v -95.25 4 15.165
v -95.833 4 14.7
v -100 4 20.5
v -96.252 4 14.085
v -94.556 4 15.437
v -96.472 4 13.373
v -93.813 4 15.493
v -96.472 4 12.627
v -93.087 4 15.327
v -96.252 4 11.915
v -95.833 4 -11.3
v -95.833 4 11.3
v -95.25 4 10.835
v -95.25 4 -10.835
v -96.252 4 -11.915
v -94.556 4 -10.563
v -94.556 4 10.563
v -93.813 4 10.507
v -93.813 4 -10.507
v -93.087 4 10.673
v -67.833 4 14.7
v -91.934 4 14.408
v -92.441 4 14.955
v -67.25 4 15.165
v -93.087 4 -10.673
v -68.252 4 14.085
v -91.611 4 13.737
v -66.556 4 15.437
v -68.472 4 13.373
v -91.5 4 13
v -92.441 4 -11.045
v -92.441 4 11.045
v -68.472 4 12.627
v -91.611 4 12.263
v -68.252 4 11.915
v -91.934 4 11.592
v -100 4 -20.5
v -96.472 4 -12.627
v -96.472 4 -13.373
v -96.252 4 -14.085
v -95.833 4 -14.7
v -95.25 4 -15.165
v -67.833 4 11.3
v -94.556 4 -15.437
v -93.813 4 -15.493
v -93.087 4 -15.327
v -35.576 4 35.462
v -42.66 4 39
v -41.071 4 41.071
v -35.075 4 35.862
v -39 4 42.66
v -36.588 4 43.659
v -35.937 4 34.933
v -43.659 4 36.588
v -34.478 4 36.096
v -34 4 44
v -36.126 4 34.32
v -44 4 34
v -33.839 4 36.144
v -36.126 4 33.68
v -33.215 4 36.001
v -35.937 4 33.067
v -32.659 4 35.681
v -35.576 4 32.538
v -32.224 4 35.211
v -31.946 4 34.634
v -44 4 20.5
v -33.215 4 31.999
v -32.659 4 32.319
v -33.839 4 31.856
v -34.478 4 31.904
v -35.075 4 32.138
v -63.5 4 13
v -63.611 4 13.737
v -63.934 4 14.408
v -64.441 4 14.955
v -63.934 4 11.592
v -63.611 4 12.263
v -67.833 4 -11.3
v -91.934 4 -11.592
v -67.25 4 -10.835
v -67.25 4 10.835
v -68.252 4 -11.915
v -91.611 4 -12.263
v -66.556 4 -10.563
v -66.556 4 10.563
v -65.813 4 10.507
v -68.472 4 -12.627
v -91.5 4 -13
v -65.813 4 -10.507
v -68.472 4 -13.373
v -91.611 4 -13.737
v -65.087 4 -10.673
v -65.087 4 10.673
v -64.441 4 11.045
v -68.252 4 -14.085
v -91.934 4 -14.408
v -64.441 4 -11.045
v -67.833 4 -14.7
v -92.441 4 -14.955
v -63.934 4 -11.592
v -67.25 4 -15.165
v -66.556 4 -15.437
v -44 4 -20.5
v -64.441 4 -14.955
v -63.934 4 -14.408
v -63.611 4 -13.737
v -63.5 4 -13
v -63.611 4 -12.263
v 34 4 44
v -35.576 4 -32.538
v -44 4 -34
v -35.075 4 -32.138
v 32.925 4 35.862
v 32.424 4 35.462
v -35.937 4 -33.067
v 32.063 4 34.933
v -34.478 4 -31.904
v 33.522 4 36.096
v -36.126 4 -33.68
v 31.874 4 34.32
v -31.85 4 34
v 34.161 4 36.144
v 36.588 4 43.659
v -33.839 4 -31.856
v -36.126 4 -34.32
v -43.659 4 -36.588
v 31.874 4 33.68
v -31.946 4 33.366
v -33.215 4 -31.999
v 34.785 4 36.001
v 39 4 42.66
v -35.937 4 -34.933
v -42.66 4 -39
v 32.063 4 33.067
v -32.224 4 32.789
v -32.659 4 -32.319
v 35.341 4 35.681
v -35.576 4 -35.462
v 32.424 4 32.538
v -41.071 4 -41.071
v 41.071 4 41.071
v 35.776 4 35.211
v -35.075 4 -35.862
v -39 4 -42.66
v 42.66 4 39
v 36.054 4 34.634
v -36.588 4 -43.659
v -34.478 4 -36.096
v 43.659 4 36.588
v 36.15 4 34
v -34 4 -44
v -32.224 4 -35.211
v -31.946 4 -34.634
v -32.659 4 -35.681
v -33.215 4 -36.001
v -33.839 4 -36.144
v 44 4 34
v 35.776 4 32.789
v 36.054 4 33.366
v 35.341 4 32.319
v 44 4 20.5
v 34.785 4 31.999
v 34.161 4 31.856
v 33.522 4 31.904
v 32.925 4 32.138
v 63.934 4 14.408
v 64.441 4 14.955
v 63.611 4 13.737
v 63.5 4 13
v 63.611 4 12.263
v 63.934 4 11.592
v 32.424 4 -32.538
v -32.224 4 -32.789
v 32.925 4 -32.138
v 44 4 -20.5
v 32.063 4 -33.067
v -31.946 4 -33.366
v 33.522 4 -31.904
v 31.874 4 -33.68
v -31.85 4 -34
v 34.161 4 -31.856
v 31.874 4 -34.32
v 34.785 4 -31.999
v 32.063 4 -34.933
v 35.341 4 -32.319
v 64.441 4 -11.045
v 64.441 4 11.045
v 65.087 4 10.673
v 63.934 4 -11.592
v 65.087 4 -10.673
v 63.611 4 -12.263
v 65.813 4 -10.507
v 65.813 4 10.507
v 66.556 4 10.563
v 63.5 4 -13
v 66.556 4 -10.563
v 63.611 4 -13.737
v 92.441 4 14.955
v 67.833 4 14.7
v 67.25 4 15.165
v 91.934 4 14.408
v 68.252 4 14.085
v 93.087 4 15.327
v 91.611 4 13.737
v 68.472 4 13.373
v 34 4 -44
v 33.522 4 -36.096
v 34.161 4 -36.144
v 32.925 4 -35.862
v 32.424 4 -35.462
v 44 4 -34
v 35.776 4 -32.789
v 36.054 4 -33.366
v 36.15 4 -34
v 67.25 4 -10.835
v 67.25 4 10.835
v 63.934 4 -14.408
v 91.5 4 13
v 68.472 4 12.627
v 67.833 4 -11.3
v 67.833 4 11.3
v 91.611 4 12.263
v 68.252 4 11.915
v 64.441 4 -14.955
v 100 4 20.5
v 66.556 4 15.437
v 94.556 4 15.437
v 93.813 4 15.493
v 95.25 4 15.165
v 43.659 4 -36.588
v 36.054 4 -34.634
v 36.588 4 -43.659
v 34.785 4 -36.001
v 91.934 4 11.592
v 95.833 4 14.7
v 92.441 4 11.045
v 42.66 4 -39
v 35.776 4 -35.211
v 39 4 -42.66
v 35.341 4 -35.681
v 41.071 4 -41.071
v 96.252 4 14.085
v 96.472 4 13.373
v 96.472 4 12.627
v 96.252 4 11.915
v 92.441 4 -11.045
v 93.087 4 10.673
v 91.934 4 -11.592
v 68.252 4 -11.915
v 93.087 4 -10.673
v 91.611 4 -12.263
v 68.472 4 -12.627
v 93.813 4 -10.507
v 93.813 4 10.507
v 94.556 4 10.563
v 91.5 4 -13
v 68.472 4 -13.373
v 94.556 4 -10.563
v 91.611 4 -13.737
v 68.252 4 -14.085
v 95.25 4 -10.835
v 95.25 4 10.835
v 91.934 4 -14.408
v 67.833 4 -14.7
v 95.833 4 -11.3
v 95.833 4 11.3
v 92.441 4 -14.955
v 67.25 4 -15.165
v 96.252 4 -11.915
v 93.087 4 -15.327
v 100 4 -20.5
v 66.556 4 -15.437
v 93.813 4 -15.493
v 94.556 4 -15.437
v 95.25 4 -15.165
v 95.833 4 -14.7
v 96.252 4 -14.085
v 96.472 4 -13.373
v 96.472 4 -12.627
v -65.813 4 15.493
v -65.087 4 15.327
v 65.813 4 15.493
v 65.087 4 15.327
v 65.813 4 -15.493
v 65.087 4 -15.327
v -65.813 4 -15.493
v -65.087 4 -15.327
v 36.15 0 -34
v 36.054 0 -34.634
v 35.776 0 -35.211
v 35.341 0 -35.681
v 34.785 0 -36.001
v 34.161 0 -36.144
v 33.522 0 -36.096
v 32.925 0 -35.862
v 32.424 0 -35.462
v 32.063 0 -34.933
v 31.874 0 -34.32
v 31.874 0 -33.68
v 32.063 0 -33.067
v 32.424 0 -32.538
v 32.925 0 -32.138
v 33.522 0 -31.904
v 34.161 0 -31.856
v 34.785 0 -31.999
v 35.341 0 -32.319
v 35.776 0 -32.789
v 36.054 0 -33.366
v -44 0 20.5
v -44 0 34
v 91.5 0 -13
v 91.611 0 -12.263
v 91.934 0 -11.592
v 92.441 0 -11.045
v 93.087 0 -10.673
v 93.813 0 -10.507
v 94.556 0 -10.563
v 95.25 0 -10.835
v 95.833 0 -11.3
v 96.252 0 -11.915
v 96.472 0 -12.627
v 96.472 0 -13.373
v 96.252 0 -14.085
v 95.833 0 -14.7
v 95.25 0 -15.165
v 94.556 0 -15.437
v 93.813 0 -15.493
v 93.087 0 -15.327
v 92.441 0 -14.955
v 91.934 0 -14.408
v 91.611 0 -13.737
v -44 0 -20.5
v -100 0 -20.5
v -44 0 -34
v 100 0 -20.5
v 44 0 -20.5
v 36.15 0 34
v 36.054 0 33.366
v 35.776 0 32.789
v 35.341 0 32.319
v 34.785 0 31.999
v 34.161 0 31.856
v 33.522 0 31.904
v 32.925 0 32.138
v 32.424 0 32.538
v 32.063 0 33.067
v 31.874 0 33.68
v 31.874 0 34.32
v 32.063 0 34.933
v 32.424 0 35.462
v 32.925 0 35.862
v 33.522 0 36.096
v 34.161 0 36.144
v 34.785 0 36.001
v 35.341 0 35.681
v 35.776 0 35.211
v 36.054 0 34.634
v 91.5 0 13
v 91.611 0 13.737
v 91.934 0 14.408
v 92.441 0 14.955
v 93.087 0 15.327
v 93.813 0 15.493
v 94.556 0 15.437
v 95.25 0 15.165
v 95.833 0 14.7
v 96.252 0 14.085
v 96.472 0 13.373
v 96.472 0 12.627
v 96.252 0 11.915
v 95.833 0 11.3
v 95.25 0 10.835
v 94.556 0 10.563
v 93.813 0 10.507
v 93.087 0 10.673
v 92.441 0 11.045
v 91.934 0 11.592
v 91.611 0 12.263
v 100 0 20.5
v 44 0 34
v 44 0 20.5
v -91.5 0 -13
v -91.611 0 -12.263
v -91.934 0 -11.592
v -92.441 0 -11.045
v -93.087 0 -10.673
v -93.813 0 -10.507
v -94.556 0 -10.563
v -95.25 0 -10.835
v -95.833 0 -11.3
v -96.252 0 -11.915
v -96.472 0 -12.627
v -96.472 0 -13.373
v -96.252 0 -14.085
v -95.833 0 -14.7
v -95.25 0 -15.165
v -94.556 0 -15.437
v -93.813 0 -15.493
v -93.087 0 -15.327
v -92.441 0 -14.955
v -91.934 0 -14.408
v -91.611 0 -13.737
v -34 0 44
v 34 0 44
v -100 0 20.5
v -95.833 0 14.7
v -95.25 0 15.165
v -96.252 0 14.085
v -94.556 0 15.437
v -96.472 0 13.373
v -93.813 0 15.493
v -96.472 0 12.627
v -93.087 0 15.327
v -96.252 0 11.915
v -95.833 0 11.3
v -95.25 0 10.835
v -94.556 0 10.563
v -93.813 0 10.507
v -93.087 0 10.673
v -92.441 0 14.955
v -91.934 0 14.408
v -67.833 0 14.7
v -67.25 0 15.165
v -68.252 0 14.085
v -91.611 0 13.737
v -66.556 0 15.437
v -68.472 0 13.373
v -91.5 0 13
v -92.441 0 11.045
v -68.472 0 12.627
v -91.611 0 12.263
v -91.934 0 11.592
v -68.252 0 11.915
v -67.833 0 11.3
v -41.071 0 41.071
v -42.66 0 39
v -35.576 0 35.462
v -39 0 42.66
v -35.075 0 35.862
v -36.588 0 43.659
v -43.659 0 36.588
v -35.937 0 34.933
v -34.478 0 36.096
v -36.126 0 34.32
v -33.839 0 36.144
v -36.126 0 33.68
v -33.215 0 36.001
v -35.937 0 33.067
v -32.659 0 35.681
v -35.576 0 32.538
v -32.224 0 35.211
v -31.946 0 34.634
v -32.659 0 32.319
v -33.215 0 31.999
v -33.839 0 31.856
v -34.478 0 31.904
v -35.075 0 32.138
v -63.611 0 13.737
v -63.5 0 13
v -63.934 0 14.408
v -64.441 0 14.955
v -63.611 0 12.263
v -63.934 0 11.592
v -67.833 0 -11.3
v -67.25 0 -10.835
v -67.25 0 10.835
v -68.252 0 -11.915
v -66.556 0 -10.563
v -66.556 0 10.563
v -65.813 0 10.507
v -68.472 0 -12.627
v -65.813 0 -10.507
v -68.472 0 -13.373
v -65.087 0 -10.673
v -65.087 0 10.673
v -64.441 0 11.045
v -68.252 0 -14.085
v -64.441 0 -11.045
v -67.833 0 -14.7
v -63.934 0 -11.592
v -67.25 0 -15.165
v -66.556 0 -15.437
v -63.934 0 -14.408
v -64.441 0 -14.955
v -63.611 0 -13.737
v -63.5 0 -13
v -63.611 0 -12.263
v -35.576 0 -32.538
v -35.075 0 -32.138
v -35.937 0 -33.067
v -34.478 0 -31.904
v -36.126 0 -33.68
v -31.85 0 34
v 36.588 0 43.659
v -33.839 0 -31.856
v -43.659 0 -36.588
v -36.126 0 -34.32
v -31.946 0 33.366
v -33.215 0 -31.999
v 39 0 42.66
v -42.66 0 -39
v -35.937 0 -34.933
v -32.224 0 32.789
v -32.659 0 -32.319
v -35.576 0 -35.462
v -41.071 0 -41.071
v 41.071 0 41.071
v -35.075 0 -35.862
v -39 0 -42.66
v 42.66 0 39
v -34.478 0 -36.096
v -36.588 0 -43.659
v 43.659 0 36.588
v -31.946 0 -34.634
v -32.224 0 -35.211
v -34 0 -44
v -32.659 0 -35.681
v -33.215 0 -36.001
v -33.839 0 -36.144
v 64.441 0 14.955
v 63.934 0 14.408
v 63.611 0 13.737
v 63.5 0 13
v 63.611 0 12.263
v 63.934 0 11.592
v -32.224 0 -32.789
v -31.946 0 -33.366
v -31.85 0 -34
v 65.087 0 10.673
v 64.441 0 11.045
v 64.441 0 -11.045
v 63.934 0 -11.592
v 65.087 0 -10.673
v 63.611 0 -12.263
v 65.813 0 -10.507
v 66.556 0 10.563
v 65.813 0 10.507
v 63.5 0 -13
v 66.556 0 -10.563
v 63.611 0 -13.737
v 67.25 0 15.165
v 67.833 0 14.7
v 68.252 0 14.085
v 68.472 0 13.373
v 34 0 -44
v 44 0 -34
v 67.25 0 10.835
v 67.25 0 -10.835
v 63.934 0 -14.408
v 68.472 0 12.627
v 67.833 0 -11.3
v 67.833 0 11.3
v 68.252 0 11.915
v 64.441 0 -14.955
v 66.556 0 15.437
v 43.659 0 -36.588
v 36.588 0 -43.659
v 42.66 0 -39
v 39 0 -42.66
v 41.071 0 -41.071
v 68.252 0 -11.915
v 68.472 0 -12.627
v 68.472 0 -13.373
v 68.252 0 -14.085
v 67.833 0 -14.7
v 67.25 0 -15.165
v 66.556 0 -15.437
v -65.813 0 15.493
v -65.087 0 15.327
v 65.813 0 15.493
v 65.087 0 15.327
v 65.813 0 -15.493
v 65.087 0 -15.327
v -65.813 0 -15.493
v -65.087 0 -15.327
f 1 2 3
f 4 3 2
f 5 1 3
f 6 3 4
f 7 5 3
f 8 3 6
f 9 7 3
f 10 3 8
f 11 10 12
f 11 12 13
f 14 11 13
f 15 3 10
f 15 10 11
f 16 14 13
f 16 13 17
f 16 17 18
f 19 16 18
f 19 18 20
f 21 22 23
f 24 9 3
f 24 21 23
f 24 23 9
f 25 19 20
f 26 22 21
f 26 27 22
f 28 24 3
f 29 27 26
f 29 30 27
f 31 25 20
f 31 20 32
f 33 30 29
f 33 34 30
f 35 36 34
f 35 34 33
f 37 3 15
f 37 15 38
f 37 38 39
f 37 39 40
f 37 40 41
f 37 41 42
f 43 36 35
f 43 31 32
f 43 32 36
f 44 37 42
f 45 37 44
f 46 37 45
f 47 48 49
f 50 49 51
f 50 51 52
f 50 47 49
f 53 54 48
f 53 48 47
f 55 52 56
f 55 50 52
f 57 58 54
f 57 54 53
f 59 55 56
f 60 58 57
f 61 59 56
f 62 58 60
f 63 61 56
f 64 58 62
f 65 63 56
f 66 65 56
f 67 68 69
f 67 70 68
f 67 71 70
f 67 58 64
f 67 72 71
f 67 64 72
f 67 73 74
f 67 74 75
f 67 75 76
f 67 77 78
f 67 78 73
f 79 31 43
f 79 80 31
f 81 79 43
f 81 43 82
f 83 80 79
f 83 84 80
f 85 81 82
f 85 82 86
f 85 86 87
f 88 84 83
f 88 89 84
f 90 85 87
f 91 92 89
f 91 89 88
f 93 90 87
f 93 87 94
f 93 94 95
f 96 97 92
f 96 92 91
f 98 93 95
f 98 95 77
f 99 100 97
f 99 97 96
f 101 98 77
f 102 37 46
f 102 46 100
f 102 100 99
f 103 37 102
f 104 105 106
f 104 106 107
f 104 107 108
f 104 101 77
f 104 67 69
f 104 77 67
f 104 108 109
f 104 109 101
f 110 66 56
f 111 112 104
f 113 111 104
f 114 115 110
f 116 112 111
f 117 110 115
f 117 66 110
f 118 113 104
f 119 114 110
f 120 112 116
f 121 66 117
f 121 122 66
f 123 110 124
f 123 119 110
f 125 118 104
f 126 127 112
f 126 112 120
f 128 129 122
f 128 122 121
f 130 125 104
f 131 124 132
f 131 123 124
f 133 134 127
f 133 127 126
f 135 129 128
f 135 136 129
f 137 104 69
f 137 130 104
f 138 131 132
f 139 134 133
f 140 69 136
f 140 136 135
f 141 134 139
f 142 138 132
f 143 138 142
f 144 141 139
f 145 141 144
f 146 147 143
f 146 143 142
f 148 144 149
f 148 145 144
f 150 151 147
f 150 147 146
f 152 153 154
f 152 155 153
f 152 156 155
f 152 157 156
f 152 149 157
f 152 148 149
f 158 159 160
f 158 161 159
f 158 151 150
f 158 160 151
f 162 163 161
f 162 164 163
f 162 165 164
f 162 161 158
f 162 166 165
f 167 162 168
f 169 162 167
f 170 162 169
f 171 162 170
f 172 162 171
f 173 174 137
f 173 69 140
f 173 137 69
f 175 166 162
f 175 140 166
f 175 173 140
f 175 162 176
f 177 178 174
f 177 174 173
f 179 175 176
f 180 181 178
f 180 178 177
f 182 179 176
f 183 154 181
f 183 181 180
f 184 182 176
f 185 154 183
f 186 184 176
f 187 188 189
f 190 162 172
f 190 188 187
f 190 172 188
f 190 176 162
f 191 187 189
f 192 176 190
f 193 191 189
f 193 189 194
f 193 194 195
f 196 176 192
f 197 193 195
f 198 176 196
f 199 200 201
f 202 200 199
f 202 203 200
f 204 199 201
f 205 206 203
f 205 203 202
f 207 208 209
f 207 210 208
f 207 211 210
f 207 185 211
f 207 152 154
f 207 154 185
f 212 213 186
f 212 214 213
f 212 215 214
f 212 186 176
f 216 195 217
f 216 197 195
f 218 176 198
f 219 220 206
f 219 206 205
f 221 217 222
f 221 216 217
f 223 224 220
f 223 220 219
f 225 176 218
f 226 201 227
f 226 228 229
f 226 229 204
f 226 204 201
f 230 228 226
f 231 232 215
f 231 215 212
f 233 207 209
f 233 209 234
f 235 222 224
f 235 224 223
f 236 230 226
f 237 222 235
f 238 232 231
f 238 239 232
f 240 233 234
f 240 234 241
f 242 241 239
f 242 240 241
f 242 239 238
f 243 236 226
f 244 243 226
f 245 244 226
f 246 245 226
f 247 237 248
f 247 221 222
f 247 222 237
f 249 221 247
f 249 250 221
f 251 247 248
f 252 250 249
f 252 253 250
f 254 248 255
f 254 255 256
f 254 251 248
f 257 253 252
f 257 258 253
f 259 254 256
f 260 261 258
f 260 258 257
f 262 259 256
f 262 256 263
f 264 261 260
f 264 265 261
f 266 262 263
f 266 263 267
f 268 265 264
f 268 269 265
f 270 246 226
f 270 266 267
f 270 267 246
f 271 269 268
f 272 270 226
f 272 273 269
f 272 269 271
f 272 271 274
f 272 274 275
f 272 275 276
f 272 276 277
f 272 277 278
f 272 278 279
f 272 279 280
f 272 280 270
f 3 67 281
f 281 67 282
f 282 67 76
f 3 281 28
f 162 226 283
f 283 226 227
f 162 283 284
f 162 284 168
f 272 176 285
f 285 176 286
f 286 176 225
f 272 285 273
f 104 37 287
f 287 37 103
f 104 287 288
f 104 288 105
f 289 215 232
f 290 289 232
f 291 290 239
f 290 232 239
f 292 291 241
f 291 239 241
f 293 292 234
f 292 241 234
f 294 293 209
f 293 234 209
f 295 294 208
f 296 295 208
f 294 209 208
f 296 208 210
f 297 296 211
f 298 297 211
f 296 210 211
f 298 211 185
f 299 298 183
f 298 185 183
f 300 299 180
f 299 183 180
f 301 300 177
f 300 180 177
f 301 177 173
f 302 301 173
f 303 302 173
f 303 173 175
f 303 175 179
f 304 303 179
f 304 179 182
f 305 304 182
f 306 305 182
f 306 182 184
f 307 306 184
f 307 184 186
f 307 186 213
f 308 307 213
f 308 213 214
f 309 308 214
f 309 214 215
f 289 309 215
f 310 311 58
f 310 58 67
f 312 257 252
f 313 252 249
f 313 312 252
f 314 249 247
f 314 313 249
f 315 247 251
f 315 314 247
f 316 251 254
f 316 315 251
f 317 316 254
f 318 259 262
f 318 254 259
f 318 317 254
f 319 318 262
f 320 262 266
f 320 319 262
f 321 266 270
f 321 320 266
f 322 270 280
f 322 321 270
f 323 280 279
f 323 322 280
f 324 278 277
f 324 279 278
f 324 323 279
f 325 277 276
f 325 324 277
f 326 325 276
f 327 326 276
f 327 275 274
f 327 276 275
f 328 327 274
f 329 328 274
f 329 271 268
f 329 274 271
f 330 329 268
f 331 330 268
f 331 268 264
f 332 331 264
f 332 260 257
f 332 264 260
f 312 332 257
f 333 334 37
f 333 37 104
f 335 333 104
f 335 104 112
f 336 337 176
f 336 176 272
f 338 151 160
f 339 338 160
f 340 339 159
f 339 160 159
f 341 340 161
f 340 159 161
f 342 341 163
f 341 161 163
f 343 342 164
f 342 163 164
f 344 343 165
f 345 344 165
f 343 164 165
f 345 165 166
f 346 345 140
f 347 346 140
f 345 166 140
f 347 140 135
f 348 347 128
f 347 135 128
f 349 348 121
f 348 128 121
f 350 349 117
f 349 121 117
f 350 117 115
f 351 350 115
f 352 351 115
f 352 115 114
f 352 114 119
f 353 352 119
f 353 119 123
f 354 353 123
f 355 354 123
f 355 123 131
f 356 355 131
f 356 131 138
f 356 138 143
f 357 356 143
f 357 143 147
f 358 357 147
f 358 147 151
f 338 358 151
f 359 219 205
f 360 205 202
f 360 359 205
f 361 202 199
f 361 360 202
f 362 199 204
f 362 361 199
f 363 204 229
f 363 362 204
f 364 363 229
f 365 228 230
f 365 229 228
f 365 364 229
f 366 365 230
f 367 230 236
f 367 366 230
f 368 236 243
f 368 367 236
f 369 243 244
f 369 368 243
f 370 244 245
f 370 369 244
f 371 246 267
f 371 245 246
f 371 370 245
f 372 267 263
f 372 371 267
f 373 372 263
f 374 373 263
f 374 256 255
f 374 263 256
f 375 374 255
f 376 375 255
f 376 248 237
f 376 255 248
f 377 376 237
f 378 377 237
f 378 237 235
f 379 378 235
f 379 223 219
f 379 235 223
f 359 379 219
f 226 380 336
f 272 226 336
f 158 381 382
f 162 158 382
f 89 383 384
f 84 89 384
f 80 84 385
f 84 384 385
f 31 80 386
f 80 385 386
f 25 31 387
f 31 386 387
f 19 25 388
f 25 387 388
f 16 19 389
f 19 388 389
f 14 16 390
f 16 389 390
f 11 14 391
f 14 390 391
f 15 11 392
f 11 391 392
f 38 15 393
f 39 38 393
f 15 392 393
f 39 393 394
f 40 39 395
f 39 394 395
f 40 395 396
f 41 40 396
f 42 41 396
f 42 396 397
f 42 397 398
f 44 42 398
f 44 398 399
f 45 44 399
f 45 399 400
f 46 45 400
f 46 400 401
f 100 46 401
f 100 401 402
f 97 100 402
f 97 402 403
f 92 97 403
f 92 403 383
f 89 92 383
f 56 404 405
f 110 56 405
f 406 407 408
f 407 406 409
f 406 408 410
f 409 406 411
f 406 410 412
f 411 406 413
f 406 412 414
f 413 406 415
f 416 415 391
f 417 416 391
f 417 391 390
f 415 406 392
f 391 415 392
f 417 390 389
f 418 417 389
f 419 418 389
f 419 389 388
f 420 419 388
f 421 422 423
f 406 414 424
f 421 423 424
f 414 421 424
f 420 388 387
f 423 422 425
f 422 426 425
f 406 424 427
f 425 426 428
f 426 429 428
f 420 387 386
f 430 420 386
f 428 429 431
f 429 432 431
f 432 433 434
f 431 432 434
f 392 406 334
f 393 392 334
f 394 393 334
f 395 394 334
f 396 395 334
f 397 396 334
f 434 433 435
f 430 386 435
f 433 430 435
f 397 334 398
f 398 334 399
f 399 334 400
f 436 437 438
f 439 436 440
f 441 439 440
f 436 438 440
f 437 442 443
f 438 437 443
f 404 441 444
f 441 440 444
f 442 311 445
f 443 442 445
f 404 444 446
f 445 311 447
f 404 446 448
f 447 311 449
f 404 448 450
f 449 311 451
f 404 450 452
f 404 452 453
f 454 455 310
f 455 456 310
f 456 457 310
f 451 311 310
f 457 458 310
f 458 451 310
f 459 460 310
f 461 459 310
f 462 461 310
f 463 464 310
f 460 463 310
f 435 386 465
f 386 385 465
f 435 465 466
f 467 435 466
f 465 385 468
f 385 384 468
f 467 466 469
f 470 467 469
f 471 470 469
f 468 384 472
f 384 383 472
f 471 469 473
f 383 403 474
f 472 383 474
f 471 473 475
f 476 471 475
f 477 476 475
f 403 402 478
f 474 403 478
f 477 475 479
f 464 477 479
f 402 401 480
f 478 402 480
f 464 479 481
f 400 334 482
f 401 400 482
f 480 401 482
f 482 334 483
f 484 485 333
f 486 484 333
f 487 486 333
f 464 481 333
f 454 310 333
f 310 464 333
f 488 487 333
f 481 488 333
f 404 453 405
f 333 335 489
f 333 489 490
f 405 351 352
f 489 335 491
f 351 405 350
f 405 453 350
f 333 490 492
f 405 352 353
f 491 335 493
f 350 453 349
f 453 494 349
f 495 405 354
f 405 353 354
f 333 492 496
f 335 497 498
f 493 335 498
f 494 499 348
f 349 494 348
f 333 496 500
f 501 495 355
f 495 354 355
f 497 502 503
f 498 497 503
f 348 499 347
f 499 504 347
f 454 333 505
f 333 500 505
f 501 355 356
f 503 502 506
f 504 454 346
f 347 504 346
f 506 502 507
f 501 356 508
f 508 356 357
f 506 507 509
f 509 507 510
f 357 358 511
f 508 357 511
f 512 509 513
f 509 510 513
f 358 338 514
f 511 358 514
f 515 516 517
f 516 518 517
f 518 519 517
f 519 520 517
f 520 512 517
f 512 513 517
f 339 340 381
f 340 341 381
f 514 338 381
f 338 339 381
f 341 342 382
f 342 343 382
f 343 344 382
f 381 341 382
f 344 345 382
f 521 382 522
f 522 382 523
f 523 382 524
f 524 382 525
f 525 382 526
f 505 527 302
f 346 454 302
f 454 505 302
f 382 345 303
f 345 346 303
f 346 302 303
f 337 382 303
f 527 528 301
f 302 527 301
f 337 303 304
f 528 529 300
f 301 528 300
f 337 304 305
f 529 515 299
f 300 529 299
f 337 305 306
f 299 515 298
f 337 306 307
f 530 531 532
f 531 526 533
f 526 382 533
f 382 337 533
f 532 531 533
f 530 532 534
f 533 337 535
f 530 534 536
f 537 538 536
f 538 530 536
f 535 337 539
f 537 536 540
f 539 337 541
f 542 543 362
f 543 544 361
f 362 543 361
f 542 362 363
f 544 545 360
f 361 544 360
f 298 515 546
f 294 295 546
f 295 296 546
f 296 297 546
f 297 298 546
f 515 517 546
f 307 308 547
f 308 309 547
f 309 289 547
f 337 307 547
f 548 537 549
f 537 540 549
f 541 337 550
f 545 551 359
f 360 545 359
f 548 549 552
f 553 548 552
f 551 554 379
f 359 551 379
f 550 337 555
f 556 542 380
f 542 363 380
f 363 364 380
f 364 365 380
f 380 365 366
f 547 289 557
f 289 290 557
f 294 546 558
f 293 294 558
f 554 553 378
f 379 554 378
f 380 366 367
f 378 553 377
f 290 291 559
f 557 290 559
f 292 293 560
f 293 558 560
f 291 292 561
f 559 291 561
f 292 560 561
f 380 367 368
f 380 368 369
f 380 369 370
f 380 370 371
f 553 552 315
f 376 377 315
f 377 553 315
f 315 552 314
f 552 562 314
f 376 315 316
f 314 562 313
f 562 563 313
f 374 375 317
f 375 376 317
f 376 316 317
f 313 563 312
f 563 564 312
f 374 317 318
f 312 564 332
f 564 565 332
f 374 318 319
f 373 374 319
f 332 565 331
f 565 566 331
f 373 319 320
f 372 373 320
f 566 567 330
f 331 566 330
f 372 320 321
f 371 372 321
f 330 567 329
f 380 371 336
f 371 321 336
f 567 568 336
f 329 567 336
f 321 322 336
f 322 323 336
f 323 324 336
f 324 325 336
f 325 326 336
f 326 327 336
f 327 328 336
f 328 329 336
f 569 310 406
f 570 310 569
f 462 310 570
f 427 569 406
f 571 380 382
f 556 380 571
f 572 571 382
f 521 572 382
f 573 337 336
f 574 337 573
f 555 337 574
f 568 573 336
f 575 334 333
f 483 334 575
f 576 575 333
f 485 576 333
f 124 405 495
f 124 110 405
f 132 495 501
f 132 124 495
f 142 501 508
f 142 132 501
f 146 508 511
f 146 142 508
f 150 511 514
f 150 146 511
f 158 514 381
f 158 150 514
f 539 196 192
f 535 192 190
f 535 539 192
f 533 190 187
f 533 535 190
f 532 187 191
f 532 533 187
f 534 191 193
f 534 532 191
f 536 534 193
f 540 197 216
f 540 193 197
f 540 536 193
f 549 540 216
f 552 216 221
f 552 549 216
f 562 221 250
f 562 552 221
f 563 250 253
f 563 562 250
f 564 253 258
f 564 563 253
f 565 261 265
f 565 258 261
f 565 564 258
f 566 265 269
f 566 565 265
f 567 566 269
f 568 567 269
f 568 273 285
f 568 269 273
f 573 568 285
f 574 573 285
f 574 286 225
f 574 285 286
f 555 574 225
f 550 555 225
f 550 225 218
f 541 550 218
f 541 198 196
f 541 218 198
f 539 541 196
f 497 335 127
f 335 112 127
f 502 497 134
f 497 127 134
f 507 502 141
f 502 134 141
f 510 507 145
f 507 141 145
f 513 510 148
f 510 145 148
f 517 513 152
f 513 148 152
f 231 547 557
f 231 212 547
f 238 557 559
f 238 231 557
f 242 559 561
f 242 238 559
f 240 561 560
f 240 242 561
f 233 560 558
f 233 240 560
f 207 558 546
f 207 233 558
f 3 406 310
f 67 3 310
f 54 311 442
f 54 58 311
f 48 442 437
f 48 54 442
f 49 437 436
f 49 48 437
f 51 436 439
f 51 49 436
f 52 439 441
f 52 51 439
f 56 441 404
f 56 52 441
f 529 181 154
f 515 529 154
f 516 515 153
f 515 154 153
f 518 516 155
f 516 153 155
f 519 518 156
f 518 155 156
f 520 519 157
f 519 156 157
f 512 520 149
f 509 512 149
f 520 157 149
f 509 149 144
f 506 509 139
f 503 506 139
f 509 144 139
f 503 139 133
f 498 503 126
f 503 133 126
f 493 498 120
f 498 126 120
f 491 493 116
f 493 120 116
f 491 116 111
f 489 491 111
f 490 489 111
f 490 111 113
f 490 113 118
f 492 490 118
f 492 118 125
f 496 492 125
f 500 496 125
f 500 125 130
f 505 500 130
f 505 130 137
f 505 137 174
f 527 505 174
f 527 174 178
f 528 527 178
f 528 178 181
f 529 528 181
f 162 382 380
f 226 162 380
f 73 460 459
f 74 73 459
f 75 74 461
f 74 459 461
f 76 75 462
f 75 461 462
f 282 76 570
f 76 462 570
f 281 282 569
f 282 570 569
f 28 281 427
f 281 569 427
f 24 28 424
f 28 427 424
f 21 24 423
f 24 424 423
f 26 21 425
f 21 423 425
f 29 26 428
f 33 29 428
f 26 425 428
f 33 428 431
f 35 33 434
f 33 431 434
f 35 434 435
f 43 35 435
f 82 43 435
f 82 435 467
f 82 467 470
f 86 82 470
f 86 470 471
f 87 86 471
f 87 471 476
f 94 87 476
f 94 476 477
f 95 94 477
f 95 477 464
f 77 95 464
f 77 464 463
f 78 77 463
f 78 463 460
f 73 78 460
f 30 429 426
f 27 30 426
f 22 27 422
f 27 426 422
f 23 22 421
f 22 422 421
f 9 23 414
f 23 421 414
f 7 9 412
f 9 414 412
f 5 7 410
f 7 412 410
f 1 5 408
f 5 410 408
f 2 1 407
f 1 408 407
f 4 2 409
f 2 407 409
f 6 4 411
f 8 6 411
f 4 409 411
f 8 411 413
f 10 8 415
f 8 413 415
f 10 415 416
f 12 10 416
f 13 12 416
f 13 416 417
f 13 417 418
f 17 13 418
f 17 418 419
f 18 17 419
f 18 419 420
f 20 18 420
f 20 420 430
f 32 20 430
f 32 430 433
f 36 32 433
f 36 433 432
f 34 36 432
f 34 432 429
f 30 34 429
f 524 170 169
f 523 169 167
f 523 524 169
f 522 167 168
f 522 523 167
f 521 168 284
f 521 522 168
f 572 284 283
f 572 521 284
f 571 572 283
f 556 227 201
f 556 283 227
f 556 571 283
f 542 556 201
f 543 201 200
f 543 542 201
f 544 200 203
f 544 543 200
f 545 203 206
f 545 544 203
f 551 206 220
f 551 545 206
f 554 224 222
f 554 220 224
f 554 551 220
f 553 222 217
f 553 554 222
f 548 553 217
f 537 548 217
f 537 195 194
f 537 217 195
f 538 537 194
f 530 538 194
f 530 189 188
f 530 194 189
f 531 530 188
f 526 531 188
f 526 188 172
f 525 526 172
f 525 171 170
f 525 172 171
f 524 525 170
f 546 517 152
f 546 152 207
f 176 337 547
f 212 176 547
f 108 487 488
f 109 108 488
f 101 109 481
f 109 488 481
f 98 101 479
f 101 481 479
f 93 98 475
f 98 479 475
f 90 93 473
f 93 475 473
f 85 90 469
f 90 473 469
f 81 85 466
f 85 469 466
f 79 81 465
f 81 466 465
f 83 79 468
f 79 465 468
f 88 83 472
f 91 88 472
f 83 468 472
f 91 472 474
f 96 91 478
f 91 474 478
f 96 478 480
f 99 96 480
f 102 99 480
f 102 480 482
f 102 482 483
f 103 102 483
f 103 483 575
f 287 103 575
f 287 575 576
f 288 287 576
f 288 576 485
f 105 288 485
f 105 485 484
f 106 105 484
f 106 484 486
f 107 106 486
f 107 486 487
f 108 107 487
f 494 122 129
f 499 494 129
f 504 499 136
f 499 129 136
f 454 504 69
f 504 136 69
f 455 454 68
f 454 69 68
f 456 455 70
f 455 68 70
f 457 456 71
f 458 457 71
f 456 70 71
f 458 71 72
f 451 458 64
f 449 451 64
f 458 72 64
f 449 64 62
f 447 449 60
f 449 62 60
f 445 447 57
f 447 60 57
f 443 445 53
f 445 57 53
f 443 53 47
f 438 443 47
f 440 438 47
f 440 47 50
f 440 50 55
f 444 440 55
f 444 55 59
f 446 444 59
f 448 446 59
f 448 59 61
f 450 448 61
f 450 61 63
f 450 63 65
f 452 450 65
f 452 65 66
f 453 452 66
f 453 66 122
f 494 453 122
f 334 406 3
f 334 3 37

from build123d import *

# Parameters (mm, degrees)
SKETCH1_W           = 88
SKETCH1_H           = 88
BOSS_EXTRUDE1_DEPTH = 4
FILLET1_R           = 10
SKETCH2_R           = 2.15
CUT_EXTRUDE1_DEPTH  = 5
SKETCH3_W           = 200
SKETCH3_H           = 41
BOSS_EXTRUDE2_DEPTH = 4
SKETCH5_R           = 2.5
CUT_EXTRUDE2_DEPTH  = 5


with BuildPart() as part:
    # Sketch1 → Boss-Extrude1 (new body)
    with BuildSketch(Plane(origin=(0, 0, 0), x_dir=(1, 0, 0), z_dir=(0, 1, 0))):
        Rectangle(SKETCH1_W, SKETCH1_H)
    extrude(amount=BOSS_EXTRUDE1_DEPTH)

    # Fillet1
    fillet1_edges = [part.edges().sort_by_distance(p)[0] for p in [
        (-44, 2, -44),
        (44, 2, -44),
        (44, 2, 44),
        (-44, 2, 44),
    ]]
    fillet(fillet1_edges, radius=FILLET1_R)

    # Sketch2 → Cut-Extrude1 (cut, through all)
    with BuildSketch(Plane(origin=(0, 4, 0), x_dir=(1, 0, 0), z_dir=(0, 1, 0))):
        with Locations((34, 34)):
            Circle(SKETCH2_R)
        with Locations((-34, 34)):
            Circle(SKETCH2_R)
        with Locations((34, -34)):
            Circle(SKETCH2_R)
        with Locations((-34, -34)):
            Circle(SKETCH2_R)
    extrude(amount=-CUT_EXTRUDE1_DEPTH, mode=Mode.SUBTRACT)

    # Sketch3 → Boss-Extrude2 (add)
    with BuildSketch(Plane(origin=(0, 0, 0), x_dir=(1, 0, 0), z_dir=(0, 1, 0))):
        Rectangle(SKETCH3_W, SKETCH3_H)
    extrude(amount=BOSS_EXTRUDE2_DEPTH)

    # Sketch5 → Cut-Extrude2 (cut, through all)
    with BuildSketch(Plane.XZ):
        with Locations((-66, 13)):
            Circle(SKETCH5_R)
        with Locations((-66, -13)):
            Circle(SKETCH5_R)
        with Locations((-94, -13)):
            Circle(SKETCH5_R)
        with Locations((-94, 13)):
            Circle(SKETCH5_R)
    cut_extrude2 = extrude(amount=-CUT_EXTRUDE2_DEPTH, mode=Mode.SUBTRACT)

    # Mirror1: Cut-Extrude2 across plane
    add(cut_extrude2.mirror(Plane(origin=(0, 0, 0), x_dir=(0, 0, 1), z_dir=(1, 0, 0))), mode=Mode.SUBTRACT)


solid = part.part
